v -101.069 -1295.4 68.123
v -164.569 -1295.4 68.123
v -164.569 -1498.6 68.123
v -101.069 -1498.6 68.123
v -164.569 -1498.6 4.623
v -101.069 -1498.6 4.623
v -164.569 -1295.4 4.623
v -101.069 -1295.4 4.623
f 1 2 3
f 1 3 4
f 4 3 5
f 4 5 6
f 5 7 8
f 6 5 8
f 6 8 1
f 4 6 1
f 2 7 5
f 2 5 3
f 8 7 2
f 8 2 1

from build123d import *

# Parameters (mm, degrees)
F0_W      = 63.5
F0_H      = 63.5
F1_DEPTH  = 1498.6
F1_FACE_W = 63.5
F1_FACE_H = 63.5
F2_DEPTH  = 1092.2
F2_FACE_W = 63.5
F2_FACE_H = 63.5
F3_DEPTH  = 203.2


with BuildPart() as f1:
    # F0 (on Front) → F1 (new body)
    with BuildSketch(Plane.XZ):
        with Locations((-132.818661, 36.373457)):
            Rectangle(F0_W, F0_H)
    extrude(amount=F1_DEPTH)

    # F1_face (on face) → F2 (cut)
    with BuildSketch(Plane(origin=(-132.818661, 0, 36.373457), x_dir=(1, 0, 0), z_dir=(0, 1, 0))):
        Rectangle(F1_FACE_W, F1_FACE_H)
    extrude(amount=-F2_DEPTH, mode=Mode.SUBTRACT)

    # F2_face (on face) → F3 (cut)
    with BuildSketch(Plane(origin=(-132.818661, -1092.2, 36.373457), x_dir=(1, 0, 0), z_dir=(0, 1, 0))):
        Rectangle(F2_FACE_W, F2_FACE_H)
    extrude(amount=-F3_DEPTH, mode=Mode.SUBTRACT)


solid = f1.part
